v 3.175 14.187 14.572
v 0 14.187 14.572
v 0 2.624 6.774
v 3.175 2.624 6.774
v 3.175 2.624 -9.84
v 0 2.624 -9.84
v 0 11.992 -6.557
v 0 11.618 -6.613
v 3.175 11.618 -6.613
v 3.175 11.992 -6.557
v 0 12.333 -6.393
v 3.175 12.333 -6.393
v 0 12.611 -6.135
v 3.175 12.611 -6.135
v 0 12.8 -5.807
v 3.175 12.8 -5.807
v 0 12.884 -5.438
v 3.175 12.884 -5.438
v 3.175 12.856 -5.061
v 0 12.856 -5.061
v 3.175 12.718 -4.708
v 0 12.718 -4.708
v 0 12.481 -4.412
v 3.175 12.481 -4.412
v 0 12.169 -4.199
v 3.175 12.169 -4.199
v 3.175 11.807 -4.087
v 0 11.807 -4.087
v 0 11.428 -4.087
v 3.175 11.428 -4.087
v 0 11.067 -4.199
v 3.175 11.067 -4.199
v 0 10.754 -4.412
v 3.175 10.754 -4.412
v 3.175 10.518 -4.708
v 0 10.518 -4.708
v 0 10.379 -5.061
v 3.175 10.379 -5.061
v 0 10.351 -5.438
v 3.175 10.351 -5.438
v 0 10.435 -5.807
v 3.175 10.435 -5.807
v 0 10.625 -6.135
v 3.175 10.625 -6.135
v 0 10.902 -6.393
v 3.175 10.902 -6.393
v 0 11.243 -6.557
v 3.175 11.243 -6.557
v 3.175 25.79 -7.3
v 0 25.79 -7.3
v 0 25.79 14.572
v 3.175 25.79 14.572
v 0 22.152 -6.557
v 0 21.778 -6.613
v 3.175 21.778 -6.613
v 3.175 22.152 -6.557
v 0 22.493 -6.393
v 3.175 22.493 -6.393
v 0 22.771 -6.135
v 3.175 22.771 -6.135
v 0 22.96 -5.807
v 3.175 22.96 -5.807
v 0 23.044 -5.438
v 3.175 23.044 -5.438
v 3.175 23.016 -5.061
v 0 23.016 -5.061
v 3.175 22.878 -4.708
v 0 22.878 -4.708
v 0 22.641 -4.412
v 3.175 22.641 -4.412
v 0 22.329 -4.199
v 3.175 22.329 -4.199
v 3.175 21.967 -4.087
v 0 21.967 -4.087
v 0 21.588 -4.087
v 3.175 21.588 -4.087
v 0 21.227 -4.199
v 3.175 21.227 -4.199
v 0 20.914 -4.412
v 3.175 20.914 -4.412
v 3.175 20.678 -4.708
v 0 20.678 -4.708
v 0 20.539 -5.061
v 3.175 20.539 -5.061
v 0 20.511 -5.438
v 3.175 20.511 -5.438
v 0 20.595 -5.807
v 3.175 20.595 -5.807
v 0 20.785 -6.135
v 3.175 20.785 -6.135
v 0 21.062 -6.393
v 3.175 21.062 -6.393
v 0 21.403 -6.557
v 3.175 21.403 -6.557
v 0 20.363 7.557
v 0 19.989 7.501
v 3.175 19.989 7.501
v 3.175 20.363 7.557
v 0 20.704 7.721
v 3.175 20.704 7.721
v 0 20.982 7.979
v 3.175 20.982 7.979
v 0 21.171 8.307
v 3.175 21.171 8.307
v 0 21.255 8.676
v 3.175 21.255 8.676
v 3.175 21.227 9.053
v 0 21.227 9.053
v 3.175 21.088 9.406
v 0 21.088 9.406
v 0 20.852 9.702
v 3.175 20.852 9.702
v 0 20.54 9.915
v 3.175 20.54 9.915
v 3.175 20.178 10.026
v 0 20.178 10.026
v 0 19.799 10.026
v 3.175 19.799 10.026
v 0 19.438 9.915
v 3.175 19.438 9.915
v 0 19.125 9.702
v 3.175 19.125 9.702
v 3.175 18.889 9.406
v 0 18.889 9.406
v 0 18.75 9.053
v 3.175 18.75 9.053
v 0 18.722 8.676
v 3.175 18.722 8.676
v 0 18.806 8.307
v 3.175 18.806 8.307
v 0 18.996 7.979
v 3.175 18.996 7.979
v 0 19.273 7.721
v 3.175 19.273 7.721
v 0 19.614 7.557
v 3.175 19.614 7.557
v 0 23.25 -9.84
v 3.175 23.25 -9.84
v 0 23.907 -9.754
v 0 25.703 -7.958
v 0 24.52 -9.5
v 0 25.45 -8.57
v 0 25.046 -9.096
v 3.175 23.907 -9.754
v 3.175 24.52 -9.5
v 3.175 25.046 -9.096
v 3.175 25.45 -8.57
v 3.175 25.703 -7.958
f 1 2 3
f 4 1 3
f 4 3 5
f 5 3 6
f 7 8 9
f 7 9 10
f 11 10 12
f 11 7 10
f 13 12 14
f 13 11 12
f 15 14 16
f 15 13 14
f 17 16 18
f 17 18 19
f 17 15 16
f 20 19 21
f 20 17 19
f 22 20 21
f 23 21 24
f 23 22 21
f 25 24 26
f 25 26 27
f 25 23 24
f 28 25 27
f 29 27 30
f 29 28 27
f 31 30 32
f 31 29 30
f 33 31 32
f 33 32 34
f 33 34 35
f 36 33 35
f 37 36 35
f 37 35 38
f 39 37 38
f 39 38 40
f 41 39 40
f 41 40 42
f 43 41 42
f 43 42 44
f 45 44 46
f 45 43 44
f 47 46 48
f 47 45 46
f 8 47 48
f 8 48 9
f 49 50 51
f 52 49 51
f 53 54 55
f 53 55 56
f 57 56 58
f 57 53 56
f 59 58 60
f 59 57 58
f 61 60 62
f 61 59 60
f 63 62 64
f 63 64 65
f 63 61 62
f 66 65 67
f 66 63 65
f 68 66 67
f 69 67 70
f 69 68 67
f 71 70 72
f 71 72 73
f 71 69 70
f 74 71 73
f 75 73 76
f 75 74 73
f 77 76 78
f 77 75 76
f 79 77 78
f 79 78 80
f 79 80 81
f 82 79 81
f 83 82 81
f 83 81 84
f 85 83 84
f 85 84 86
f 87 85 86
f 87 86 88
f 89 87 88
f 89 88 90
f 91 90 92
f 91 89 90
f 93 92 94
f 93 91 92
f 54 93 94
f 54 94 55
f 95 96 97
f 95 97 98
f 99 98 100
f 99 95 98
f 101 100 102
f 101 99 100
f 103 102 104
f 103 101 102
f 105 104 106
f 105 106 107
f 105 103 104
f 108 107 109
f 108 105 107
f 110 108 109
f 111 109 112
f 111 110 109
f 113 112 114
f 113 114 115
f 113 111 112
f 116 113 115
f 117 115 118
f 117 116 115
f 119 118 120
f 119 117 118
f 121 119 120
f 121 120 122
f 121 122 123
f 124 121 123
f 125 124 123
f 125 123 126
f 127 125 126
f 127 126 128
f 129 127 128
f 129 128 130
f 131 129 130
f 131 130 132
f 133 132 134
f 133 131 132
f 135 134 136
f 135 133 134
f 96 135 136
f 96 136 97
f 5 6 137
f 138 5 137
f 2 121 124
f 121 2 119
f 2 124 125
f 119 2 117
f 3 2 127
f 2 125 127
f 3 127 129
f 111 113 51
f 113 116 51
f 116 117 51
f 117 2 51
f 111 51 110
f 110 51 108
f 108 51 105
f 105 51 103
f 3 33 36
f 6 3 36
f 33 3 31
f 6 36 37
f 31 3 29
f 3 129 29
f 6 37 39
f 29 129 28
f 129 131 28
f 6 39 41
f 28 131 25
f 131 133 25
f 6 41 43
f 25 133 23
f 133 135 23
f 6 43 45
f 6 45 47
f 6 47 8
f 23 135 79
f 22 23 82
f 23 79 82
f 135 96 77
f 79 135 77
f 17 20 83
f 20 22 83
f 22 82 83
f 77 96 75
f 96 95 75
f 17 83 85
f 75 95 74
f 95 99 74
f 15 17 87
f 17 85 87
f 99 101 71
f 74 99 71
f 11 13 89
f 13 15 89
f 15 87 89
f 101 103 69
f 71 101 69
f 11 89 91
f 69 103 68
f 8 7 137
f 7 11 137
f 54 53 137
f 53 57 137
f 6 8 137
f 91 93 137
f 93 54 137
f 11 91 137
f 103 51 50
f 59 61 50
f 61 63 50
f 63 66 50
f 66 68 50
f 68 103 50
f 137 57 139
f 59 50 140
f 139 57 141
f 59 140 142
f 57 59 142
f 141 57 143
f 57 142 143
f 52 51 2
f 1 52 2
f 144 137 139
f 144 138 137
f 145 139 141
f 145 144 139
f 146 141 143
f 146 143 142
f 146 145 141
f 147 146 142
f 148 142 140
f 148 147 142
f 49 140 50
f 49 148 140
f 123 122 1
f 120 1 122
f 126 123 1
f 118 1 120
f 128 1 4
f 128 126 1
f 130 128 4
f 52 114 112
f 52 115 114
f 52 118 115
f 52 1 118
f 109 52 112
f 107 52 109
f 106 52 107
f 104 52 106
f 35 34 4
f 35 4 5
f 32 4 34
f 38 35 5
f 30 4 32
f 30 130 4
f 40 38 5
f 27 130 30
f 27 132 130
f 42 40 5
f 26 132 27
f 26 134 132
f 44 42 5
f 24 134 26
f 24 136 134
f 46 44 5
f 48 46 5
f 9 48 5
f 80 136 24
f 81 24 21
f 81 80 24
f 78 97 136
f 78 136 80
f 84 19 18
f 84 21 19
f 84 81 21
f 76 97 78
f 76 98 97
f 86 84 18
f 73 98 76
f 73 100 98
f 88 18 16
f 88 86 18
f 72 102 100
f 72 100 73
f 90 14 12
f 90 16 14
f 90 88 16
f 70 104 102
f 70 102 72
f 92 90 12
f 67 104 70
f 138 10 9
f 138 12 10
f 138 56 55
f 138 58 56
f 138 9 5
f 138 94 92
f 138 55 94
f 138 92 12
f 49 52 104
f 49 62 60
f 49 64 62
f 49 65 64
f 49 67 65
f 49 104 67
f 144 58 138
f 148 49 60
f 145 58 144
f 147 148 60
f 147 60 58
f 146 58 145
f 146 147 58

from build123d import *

# Parameters (mm, degrees)
SKETCH1_R           = 1.27
BOSS_EXTRUDE1_DEPTH = 3.175
FILLET3_R           = 2.54


with BuildPart() as part:
    # Sketch1 → Boss-Extrude1 (new body)
    with BuildSketch(Plane(origin=(0, 0, 0), x_dir=(0, 0, -1), z_dir=(1, 0, 0))):
        Polygon((0.846258814, 2.623762197), (9.840144814, 2.623762197), (9.840144814, 25.789873149), (0.846258814, 25.789873149), (-14.571831472, 25.789873149), (-14.571831472, 14.187329911), (-6.773741186, 2.623762197), align=None)
        with Locations((5.343201814, 21.777648197)):
            Circle(SKETCH1_R, mode=Mode.SUBTRACT)
        with Locations((5.343201814, 11.617648197)):
            Circle(SKETCH1_R, mode=Mode.SUBTRACT)
        with Locations((-8.770559864, 19.98860153)):
            Circle(SKETCH1_R, mode=Mode.SUBTRACT)
    extrude(amount=BOSS_EXTRUDE1_DEPTH)

    # Fillet3
    fillet3_edges = [part.edges().sort_by_distance(p)[0] for p in [
        (1.5875, 25.789873149, -9.840144814),
    ]]
    fillet(fillet3_edges, radius=FILLET3_R)


solid = part.part
